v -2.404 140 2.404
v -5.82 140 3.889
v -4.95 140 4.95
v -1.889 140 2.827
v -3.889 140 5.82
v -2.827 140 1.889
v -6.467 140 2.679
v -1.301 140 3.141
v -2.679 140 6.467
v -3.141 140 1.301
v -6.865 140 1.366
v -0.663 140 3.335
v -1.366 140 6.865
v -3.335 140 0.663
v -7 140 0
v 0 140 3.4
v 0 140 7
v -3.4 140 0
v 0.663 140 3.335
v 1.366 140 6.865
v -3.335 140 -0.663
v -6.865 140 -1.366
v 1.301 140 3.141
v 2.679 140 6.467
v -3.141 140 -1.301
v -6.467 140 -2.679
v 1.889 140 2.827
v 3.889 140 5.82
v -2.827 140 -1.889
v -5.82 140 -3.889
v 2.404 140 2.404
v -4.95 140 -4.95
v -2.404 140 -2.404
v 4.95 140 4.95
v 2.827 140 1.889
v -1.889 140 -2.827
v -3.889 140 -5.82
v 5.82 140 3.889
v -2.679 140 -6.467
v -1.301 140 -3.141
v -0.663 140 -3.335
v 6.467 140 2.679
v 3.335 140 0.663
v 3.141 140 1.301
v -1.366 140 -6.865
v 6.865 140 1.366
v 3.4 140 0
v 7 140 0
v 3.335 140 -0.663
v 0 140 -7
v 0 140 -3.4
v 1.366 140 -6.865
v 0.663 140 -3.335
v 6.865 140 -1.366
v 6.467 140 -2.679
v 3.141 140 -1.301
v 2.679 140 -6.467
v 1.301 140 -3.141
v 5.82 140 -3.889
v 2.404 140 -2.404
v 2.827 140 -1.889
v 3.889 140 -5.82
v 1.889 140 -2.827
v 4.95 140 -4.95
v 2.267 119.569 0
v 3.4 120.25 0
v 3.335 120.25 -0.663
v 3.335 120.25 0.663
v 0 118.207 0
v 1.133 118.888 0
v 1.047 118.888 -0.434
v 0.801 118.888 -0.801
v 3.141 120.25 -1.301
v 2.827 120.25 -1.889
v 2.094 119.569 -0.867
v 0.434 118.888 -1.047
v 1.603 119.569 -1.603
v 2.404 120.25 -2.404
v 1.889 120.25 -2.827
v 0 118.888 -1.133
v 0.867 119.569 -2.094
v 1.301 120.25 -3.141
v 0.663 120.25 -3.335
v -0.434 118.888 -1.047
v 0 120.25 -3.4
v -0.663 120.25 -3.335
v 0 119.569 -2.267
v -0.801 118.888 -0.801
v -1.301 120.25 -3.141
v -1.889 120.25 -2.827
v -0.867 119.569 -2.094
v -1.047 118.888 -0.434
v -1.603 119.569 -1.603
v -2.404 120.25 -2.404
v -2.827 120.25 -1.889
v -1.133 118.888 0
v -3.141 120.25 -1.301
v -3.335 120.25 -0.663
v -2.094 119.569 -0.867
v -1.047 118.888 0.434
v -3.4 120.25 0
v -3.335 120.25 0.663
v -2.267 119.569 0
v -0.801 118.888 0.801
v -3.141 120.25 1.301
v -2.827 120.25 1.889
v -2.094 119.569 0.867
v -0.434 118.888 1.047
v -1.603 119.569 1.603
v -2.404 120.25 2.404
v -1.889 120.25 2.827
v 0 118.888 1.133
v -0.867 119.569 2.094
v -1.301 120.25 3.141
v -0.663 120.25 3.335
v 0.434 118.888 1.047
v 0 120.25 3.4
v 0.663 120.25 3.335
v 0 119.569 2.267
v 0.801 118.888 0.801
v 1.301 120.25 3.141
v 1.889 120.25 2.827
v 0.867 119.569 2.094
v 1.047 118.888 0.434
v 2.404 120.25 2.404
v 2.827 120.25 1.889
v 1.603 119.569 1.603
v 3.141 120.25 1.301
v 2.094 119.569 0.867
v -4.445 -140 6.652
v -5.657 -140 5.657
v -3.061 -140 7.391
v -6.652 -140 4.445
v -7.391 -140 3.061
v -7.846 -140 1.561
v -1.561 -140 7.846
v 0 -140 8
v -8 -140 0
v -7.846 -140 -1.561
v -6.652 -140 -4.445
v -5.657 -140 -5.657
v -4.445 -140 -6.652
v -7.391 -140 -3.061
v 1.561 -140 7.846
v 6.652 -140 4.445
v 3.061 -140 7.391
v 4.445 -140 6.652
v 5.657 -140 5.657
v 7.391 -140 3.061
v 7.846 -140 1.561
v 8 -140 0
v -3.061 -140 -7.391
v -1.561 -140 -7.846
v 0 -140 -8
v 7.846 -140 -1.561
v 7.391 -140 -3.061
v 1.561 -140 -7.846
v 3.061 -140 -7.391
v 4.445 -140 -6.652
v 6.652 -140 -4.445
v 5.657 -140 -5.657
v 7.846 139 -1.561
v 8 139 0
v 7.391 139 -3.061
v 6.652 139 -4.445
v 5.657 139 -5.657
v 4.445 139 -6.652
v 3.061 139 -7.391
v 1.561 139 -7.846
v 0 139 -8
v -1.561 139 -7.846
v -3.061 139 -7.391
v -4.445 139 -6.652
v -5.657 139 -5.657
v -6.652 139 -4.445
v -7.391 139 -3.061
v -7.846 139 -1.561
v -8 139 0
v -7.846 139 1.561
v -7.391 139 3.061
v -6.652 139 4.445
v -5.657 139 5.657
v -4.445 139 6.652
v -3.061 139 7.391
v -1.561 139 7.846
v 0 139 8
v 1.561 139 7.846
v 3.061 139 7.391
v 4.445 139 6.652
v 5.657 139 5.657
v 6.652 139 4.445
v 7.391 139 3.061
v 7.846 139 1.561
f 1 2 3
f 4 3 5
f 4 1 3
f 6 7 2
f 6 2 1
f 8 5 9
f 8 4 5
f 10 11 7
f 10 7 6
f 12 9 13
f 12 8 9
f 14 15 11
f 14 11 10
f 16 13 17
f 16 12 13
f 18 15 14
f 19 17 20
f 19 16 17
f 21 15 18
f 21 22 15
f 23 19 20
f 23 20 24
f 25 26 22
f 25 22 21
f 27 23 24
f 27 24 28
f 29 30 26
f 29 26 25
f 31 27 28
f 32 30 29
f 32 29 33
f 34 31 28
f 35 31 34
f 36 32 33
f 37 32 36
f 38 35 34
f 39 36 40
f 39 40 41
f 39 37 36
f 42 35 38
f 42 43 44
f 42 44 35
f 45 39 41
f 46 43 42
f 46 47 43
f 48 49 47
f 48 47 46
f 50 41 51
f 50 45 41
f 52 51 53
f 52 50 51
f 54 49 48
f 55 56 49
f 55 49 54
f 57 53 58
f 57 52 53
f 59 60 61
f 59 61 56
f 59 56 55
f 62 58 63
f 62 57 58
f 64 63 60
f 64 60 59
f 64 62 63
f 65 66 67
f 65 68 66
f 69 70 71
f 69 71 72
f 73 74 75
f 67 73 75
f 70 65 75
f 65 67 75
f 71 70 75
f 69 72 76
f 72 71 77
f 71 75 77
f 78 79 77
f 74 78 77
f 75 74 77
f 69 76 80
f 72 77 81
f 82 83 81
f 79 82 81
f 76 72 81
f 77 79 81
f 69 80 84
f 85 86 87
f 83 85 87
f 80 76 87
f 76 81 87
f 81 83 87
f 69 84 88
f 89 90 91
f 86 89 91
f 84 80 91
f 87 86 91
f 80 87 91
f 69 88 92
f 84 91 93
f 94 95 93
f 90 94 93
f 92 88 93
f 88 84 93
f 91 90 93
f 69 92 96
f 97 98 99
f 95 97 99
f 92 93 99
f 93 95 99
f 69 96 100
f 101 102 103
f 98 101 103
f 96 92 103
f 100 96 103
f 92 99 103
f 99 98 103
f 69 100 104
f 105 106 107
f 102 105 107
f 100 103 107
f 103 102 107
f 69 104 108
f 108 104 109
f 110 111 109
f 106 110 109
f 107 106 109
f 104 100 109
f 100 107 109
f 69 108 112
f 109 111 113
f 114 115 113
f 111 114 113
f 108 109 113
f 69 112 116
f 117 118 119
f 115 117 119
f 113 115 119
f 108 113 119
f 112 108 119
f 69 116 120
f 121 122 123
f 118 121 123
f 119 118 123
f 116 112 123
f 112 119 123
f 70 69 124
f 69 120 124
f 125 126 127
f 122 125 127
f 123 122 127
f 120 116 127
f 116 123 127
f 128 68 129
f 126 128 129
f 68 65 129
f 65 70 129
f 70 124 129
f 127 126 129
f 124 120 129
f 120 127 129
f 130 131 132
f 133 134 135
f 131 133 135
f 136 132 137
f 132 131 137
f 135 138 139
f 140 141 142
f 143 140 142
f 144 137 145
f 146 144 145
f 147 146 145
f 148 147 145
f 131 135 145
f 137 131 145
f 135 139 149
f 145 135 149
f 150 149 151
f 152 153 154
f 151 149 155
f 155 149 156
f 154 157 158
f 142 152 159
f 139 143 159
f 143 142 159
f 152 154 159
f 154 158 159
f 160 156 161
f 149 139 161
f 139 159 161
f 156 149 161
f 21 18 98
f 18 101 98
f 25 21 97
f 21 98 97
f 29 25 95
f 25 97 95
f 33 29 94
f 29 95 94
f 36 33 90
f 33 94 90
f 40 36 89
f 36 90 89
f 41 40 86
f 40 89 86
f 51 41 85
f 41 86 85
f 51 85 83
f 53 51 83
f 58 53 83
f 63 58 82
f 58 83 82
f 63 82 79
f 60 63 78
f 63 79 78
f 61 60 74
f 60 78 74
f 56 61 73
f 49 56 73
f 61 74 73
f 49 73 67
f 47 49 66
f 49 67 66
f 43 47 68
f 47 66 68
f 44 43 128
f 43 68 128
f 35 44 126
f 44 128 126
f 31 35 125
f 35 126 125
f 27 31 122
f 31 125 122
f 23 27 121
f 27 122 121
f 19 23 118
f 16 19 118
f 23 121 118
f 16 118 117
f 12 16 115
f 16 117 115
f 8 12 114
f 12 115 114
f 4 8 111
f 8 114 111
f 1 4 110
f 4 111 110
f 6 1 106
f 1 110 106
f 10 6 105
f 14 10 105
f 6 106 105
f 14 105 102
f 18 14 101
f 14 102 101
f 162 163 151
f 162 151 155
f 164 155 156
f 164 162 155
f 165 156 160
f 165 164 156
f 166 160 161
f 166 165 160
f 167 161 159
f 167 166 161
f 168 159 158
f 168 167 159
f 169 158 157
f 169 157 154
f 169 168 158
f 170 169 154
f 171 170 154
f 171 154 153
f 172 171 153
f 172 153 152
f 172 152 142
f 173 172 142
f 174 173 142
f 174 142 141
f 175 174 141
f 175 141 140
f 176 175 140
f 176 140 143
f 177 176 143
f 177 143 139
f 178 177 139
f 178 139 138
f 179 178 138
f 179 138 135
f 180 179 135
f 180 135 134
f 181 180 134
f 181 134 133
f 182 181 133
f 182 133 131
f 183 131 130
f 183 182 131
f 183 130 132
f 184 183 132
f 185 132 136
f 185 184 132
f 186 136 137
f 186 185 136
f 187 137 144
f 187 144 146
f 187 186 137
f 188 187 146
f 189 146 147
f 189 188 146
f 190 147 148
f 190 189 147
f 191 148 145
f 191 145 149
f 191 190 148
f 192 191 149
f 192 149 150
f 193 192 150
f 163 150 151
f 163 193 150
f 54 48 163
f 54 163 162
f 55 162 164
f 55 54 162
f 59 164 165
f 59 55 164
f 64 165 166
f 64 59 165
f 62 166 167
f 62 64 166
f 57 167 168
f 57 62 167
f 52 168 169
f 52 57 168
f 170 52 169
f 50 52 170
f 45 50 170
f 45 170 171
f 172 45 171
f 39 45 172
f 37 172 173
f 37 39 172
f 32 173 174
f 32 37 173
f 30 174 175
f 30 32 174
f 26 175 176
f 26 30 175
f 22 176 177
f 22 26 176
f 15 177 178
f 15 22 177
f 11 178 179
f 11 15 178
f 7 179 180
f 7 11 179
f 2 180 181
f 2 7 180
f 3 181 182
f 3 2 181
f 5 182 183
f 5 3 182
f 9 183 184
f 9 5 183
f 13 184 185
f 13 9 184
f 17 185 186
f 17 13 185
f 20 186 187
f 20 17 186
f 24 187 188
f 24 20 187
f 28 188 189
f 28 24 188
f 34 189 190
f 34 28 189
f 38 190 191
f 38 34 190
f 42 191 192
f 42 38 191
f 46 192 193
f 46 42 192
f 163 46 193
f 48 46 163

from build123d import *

# Parameters (mm, degrees)
SKETCH1_R             = 8
BOSS_EXTRUDE1_DEPTH   = 140
M8_TAPPED_HOLE1_D     = 6.8
M8_TAPPED_HOLE1_DEPTH = 19.75
M8_TAPPED_HOLE1_TIP   = 2.042926105
CHAMFER1_SIZE         = 1


with BuildPart() as part:
    # Sketch1 → Boss-Extrude1 (new body, symmetric)
    with BuildSketch(Plane(origin=(0, 0, 0), x_dir=(1, 0, 0), z_dir=(0, 1, 0))):
        Circle(SKETCH1_R)
    extrude(amount=BOSS_EXTRUDE1_DEPTH, both=True)

    # M8 Tapped Hole1
    with Locations(Plane(origin=(0, 140, 0), x_dir=(1, 0, 0), z_dir=(0, 1, 0))):
        with Locations((0, 0)):
            Hole(M8_TAPPED_HOLE1_D / 2, depth=M8_TAPPED_HOLE1_DEPTH)
            with Locations((0, 0, -(M8_TAPPED_HOLE1_DEPTH + M8_TAPPED_HOLE1_TIP / 2))):  # 118° drill point
                Cone(0, M8_TAPPED_HOLE1_D / 2, M8_TAPPED_HOLE1_TIP, mode=Mode.SUBTRACT)

    # Chamfer1
    chamfer1_edges = [part.edges().sort_by_distance(p)[0] for p in [
        (-8, 140, 0),
    ]]
    chamfer(chamfer1_edges, length=CHAMFER1_SIZE)


solid = part.part
